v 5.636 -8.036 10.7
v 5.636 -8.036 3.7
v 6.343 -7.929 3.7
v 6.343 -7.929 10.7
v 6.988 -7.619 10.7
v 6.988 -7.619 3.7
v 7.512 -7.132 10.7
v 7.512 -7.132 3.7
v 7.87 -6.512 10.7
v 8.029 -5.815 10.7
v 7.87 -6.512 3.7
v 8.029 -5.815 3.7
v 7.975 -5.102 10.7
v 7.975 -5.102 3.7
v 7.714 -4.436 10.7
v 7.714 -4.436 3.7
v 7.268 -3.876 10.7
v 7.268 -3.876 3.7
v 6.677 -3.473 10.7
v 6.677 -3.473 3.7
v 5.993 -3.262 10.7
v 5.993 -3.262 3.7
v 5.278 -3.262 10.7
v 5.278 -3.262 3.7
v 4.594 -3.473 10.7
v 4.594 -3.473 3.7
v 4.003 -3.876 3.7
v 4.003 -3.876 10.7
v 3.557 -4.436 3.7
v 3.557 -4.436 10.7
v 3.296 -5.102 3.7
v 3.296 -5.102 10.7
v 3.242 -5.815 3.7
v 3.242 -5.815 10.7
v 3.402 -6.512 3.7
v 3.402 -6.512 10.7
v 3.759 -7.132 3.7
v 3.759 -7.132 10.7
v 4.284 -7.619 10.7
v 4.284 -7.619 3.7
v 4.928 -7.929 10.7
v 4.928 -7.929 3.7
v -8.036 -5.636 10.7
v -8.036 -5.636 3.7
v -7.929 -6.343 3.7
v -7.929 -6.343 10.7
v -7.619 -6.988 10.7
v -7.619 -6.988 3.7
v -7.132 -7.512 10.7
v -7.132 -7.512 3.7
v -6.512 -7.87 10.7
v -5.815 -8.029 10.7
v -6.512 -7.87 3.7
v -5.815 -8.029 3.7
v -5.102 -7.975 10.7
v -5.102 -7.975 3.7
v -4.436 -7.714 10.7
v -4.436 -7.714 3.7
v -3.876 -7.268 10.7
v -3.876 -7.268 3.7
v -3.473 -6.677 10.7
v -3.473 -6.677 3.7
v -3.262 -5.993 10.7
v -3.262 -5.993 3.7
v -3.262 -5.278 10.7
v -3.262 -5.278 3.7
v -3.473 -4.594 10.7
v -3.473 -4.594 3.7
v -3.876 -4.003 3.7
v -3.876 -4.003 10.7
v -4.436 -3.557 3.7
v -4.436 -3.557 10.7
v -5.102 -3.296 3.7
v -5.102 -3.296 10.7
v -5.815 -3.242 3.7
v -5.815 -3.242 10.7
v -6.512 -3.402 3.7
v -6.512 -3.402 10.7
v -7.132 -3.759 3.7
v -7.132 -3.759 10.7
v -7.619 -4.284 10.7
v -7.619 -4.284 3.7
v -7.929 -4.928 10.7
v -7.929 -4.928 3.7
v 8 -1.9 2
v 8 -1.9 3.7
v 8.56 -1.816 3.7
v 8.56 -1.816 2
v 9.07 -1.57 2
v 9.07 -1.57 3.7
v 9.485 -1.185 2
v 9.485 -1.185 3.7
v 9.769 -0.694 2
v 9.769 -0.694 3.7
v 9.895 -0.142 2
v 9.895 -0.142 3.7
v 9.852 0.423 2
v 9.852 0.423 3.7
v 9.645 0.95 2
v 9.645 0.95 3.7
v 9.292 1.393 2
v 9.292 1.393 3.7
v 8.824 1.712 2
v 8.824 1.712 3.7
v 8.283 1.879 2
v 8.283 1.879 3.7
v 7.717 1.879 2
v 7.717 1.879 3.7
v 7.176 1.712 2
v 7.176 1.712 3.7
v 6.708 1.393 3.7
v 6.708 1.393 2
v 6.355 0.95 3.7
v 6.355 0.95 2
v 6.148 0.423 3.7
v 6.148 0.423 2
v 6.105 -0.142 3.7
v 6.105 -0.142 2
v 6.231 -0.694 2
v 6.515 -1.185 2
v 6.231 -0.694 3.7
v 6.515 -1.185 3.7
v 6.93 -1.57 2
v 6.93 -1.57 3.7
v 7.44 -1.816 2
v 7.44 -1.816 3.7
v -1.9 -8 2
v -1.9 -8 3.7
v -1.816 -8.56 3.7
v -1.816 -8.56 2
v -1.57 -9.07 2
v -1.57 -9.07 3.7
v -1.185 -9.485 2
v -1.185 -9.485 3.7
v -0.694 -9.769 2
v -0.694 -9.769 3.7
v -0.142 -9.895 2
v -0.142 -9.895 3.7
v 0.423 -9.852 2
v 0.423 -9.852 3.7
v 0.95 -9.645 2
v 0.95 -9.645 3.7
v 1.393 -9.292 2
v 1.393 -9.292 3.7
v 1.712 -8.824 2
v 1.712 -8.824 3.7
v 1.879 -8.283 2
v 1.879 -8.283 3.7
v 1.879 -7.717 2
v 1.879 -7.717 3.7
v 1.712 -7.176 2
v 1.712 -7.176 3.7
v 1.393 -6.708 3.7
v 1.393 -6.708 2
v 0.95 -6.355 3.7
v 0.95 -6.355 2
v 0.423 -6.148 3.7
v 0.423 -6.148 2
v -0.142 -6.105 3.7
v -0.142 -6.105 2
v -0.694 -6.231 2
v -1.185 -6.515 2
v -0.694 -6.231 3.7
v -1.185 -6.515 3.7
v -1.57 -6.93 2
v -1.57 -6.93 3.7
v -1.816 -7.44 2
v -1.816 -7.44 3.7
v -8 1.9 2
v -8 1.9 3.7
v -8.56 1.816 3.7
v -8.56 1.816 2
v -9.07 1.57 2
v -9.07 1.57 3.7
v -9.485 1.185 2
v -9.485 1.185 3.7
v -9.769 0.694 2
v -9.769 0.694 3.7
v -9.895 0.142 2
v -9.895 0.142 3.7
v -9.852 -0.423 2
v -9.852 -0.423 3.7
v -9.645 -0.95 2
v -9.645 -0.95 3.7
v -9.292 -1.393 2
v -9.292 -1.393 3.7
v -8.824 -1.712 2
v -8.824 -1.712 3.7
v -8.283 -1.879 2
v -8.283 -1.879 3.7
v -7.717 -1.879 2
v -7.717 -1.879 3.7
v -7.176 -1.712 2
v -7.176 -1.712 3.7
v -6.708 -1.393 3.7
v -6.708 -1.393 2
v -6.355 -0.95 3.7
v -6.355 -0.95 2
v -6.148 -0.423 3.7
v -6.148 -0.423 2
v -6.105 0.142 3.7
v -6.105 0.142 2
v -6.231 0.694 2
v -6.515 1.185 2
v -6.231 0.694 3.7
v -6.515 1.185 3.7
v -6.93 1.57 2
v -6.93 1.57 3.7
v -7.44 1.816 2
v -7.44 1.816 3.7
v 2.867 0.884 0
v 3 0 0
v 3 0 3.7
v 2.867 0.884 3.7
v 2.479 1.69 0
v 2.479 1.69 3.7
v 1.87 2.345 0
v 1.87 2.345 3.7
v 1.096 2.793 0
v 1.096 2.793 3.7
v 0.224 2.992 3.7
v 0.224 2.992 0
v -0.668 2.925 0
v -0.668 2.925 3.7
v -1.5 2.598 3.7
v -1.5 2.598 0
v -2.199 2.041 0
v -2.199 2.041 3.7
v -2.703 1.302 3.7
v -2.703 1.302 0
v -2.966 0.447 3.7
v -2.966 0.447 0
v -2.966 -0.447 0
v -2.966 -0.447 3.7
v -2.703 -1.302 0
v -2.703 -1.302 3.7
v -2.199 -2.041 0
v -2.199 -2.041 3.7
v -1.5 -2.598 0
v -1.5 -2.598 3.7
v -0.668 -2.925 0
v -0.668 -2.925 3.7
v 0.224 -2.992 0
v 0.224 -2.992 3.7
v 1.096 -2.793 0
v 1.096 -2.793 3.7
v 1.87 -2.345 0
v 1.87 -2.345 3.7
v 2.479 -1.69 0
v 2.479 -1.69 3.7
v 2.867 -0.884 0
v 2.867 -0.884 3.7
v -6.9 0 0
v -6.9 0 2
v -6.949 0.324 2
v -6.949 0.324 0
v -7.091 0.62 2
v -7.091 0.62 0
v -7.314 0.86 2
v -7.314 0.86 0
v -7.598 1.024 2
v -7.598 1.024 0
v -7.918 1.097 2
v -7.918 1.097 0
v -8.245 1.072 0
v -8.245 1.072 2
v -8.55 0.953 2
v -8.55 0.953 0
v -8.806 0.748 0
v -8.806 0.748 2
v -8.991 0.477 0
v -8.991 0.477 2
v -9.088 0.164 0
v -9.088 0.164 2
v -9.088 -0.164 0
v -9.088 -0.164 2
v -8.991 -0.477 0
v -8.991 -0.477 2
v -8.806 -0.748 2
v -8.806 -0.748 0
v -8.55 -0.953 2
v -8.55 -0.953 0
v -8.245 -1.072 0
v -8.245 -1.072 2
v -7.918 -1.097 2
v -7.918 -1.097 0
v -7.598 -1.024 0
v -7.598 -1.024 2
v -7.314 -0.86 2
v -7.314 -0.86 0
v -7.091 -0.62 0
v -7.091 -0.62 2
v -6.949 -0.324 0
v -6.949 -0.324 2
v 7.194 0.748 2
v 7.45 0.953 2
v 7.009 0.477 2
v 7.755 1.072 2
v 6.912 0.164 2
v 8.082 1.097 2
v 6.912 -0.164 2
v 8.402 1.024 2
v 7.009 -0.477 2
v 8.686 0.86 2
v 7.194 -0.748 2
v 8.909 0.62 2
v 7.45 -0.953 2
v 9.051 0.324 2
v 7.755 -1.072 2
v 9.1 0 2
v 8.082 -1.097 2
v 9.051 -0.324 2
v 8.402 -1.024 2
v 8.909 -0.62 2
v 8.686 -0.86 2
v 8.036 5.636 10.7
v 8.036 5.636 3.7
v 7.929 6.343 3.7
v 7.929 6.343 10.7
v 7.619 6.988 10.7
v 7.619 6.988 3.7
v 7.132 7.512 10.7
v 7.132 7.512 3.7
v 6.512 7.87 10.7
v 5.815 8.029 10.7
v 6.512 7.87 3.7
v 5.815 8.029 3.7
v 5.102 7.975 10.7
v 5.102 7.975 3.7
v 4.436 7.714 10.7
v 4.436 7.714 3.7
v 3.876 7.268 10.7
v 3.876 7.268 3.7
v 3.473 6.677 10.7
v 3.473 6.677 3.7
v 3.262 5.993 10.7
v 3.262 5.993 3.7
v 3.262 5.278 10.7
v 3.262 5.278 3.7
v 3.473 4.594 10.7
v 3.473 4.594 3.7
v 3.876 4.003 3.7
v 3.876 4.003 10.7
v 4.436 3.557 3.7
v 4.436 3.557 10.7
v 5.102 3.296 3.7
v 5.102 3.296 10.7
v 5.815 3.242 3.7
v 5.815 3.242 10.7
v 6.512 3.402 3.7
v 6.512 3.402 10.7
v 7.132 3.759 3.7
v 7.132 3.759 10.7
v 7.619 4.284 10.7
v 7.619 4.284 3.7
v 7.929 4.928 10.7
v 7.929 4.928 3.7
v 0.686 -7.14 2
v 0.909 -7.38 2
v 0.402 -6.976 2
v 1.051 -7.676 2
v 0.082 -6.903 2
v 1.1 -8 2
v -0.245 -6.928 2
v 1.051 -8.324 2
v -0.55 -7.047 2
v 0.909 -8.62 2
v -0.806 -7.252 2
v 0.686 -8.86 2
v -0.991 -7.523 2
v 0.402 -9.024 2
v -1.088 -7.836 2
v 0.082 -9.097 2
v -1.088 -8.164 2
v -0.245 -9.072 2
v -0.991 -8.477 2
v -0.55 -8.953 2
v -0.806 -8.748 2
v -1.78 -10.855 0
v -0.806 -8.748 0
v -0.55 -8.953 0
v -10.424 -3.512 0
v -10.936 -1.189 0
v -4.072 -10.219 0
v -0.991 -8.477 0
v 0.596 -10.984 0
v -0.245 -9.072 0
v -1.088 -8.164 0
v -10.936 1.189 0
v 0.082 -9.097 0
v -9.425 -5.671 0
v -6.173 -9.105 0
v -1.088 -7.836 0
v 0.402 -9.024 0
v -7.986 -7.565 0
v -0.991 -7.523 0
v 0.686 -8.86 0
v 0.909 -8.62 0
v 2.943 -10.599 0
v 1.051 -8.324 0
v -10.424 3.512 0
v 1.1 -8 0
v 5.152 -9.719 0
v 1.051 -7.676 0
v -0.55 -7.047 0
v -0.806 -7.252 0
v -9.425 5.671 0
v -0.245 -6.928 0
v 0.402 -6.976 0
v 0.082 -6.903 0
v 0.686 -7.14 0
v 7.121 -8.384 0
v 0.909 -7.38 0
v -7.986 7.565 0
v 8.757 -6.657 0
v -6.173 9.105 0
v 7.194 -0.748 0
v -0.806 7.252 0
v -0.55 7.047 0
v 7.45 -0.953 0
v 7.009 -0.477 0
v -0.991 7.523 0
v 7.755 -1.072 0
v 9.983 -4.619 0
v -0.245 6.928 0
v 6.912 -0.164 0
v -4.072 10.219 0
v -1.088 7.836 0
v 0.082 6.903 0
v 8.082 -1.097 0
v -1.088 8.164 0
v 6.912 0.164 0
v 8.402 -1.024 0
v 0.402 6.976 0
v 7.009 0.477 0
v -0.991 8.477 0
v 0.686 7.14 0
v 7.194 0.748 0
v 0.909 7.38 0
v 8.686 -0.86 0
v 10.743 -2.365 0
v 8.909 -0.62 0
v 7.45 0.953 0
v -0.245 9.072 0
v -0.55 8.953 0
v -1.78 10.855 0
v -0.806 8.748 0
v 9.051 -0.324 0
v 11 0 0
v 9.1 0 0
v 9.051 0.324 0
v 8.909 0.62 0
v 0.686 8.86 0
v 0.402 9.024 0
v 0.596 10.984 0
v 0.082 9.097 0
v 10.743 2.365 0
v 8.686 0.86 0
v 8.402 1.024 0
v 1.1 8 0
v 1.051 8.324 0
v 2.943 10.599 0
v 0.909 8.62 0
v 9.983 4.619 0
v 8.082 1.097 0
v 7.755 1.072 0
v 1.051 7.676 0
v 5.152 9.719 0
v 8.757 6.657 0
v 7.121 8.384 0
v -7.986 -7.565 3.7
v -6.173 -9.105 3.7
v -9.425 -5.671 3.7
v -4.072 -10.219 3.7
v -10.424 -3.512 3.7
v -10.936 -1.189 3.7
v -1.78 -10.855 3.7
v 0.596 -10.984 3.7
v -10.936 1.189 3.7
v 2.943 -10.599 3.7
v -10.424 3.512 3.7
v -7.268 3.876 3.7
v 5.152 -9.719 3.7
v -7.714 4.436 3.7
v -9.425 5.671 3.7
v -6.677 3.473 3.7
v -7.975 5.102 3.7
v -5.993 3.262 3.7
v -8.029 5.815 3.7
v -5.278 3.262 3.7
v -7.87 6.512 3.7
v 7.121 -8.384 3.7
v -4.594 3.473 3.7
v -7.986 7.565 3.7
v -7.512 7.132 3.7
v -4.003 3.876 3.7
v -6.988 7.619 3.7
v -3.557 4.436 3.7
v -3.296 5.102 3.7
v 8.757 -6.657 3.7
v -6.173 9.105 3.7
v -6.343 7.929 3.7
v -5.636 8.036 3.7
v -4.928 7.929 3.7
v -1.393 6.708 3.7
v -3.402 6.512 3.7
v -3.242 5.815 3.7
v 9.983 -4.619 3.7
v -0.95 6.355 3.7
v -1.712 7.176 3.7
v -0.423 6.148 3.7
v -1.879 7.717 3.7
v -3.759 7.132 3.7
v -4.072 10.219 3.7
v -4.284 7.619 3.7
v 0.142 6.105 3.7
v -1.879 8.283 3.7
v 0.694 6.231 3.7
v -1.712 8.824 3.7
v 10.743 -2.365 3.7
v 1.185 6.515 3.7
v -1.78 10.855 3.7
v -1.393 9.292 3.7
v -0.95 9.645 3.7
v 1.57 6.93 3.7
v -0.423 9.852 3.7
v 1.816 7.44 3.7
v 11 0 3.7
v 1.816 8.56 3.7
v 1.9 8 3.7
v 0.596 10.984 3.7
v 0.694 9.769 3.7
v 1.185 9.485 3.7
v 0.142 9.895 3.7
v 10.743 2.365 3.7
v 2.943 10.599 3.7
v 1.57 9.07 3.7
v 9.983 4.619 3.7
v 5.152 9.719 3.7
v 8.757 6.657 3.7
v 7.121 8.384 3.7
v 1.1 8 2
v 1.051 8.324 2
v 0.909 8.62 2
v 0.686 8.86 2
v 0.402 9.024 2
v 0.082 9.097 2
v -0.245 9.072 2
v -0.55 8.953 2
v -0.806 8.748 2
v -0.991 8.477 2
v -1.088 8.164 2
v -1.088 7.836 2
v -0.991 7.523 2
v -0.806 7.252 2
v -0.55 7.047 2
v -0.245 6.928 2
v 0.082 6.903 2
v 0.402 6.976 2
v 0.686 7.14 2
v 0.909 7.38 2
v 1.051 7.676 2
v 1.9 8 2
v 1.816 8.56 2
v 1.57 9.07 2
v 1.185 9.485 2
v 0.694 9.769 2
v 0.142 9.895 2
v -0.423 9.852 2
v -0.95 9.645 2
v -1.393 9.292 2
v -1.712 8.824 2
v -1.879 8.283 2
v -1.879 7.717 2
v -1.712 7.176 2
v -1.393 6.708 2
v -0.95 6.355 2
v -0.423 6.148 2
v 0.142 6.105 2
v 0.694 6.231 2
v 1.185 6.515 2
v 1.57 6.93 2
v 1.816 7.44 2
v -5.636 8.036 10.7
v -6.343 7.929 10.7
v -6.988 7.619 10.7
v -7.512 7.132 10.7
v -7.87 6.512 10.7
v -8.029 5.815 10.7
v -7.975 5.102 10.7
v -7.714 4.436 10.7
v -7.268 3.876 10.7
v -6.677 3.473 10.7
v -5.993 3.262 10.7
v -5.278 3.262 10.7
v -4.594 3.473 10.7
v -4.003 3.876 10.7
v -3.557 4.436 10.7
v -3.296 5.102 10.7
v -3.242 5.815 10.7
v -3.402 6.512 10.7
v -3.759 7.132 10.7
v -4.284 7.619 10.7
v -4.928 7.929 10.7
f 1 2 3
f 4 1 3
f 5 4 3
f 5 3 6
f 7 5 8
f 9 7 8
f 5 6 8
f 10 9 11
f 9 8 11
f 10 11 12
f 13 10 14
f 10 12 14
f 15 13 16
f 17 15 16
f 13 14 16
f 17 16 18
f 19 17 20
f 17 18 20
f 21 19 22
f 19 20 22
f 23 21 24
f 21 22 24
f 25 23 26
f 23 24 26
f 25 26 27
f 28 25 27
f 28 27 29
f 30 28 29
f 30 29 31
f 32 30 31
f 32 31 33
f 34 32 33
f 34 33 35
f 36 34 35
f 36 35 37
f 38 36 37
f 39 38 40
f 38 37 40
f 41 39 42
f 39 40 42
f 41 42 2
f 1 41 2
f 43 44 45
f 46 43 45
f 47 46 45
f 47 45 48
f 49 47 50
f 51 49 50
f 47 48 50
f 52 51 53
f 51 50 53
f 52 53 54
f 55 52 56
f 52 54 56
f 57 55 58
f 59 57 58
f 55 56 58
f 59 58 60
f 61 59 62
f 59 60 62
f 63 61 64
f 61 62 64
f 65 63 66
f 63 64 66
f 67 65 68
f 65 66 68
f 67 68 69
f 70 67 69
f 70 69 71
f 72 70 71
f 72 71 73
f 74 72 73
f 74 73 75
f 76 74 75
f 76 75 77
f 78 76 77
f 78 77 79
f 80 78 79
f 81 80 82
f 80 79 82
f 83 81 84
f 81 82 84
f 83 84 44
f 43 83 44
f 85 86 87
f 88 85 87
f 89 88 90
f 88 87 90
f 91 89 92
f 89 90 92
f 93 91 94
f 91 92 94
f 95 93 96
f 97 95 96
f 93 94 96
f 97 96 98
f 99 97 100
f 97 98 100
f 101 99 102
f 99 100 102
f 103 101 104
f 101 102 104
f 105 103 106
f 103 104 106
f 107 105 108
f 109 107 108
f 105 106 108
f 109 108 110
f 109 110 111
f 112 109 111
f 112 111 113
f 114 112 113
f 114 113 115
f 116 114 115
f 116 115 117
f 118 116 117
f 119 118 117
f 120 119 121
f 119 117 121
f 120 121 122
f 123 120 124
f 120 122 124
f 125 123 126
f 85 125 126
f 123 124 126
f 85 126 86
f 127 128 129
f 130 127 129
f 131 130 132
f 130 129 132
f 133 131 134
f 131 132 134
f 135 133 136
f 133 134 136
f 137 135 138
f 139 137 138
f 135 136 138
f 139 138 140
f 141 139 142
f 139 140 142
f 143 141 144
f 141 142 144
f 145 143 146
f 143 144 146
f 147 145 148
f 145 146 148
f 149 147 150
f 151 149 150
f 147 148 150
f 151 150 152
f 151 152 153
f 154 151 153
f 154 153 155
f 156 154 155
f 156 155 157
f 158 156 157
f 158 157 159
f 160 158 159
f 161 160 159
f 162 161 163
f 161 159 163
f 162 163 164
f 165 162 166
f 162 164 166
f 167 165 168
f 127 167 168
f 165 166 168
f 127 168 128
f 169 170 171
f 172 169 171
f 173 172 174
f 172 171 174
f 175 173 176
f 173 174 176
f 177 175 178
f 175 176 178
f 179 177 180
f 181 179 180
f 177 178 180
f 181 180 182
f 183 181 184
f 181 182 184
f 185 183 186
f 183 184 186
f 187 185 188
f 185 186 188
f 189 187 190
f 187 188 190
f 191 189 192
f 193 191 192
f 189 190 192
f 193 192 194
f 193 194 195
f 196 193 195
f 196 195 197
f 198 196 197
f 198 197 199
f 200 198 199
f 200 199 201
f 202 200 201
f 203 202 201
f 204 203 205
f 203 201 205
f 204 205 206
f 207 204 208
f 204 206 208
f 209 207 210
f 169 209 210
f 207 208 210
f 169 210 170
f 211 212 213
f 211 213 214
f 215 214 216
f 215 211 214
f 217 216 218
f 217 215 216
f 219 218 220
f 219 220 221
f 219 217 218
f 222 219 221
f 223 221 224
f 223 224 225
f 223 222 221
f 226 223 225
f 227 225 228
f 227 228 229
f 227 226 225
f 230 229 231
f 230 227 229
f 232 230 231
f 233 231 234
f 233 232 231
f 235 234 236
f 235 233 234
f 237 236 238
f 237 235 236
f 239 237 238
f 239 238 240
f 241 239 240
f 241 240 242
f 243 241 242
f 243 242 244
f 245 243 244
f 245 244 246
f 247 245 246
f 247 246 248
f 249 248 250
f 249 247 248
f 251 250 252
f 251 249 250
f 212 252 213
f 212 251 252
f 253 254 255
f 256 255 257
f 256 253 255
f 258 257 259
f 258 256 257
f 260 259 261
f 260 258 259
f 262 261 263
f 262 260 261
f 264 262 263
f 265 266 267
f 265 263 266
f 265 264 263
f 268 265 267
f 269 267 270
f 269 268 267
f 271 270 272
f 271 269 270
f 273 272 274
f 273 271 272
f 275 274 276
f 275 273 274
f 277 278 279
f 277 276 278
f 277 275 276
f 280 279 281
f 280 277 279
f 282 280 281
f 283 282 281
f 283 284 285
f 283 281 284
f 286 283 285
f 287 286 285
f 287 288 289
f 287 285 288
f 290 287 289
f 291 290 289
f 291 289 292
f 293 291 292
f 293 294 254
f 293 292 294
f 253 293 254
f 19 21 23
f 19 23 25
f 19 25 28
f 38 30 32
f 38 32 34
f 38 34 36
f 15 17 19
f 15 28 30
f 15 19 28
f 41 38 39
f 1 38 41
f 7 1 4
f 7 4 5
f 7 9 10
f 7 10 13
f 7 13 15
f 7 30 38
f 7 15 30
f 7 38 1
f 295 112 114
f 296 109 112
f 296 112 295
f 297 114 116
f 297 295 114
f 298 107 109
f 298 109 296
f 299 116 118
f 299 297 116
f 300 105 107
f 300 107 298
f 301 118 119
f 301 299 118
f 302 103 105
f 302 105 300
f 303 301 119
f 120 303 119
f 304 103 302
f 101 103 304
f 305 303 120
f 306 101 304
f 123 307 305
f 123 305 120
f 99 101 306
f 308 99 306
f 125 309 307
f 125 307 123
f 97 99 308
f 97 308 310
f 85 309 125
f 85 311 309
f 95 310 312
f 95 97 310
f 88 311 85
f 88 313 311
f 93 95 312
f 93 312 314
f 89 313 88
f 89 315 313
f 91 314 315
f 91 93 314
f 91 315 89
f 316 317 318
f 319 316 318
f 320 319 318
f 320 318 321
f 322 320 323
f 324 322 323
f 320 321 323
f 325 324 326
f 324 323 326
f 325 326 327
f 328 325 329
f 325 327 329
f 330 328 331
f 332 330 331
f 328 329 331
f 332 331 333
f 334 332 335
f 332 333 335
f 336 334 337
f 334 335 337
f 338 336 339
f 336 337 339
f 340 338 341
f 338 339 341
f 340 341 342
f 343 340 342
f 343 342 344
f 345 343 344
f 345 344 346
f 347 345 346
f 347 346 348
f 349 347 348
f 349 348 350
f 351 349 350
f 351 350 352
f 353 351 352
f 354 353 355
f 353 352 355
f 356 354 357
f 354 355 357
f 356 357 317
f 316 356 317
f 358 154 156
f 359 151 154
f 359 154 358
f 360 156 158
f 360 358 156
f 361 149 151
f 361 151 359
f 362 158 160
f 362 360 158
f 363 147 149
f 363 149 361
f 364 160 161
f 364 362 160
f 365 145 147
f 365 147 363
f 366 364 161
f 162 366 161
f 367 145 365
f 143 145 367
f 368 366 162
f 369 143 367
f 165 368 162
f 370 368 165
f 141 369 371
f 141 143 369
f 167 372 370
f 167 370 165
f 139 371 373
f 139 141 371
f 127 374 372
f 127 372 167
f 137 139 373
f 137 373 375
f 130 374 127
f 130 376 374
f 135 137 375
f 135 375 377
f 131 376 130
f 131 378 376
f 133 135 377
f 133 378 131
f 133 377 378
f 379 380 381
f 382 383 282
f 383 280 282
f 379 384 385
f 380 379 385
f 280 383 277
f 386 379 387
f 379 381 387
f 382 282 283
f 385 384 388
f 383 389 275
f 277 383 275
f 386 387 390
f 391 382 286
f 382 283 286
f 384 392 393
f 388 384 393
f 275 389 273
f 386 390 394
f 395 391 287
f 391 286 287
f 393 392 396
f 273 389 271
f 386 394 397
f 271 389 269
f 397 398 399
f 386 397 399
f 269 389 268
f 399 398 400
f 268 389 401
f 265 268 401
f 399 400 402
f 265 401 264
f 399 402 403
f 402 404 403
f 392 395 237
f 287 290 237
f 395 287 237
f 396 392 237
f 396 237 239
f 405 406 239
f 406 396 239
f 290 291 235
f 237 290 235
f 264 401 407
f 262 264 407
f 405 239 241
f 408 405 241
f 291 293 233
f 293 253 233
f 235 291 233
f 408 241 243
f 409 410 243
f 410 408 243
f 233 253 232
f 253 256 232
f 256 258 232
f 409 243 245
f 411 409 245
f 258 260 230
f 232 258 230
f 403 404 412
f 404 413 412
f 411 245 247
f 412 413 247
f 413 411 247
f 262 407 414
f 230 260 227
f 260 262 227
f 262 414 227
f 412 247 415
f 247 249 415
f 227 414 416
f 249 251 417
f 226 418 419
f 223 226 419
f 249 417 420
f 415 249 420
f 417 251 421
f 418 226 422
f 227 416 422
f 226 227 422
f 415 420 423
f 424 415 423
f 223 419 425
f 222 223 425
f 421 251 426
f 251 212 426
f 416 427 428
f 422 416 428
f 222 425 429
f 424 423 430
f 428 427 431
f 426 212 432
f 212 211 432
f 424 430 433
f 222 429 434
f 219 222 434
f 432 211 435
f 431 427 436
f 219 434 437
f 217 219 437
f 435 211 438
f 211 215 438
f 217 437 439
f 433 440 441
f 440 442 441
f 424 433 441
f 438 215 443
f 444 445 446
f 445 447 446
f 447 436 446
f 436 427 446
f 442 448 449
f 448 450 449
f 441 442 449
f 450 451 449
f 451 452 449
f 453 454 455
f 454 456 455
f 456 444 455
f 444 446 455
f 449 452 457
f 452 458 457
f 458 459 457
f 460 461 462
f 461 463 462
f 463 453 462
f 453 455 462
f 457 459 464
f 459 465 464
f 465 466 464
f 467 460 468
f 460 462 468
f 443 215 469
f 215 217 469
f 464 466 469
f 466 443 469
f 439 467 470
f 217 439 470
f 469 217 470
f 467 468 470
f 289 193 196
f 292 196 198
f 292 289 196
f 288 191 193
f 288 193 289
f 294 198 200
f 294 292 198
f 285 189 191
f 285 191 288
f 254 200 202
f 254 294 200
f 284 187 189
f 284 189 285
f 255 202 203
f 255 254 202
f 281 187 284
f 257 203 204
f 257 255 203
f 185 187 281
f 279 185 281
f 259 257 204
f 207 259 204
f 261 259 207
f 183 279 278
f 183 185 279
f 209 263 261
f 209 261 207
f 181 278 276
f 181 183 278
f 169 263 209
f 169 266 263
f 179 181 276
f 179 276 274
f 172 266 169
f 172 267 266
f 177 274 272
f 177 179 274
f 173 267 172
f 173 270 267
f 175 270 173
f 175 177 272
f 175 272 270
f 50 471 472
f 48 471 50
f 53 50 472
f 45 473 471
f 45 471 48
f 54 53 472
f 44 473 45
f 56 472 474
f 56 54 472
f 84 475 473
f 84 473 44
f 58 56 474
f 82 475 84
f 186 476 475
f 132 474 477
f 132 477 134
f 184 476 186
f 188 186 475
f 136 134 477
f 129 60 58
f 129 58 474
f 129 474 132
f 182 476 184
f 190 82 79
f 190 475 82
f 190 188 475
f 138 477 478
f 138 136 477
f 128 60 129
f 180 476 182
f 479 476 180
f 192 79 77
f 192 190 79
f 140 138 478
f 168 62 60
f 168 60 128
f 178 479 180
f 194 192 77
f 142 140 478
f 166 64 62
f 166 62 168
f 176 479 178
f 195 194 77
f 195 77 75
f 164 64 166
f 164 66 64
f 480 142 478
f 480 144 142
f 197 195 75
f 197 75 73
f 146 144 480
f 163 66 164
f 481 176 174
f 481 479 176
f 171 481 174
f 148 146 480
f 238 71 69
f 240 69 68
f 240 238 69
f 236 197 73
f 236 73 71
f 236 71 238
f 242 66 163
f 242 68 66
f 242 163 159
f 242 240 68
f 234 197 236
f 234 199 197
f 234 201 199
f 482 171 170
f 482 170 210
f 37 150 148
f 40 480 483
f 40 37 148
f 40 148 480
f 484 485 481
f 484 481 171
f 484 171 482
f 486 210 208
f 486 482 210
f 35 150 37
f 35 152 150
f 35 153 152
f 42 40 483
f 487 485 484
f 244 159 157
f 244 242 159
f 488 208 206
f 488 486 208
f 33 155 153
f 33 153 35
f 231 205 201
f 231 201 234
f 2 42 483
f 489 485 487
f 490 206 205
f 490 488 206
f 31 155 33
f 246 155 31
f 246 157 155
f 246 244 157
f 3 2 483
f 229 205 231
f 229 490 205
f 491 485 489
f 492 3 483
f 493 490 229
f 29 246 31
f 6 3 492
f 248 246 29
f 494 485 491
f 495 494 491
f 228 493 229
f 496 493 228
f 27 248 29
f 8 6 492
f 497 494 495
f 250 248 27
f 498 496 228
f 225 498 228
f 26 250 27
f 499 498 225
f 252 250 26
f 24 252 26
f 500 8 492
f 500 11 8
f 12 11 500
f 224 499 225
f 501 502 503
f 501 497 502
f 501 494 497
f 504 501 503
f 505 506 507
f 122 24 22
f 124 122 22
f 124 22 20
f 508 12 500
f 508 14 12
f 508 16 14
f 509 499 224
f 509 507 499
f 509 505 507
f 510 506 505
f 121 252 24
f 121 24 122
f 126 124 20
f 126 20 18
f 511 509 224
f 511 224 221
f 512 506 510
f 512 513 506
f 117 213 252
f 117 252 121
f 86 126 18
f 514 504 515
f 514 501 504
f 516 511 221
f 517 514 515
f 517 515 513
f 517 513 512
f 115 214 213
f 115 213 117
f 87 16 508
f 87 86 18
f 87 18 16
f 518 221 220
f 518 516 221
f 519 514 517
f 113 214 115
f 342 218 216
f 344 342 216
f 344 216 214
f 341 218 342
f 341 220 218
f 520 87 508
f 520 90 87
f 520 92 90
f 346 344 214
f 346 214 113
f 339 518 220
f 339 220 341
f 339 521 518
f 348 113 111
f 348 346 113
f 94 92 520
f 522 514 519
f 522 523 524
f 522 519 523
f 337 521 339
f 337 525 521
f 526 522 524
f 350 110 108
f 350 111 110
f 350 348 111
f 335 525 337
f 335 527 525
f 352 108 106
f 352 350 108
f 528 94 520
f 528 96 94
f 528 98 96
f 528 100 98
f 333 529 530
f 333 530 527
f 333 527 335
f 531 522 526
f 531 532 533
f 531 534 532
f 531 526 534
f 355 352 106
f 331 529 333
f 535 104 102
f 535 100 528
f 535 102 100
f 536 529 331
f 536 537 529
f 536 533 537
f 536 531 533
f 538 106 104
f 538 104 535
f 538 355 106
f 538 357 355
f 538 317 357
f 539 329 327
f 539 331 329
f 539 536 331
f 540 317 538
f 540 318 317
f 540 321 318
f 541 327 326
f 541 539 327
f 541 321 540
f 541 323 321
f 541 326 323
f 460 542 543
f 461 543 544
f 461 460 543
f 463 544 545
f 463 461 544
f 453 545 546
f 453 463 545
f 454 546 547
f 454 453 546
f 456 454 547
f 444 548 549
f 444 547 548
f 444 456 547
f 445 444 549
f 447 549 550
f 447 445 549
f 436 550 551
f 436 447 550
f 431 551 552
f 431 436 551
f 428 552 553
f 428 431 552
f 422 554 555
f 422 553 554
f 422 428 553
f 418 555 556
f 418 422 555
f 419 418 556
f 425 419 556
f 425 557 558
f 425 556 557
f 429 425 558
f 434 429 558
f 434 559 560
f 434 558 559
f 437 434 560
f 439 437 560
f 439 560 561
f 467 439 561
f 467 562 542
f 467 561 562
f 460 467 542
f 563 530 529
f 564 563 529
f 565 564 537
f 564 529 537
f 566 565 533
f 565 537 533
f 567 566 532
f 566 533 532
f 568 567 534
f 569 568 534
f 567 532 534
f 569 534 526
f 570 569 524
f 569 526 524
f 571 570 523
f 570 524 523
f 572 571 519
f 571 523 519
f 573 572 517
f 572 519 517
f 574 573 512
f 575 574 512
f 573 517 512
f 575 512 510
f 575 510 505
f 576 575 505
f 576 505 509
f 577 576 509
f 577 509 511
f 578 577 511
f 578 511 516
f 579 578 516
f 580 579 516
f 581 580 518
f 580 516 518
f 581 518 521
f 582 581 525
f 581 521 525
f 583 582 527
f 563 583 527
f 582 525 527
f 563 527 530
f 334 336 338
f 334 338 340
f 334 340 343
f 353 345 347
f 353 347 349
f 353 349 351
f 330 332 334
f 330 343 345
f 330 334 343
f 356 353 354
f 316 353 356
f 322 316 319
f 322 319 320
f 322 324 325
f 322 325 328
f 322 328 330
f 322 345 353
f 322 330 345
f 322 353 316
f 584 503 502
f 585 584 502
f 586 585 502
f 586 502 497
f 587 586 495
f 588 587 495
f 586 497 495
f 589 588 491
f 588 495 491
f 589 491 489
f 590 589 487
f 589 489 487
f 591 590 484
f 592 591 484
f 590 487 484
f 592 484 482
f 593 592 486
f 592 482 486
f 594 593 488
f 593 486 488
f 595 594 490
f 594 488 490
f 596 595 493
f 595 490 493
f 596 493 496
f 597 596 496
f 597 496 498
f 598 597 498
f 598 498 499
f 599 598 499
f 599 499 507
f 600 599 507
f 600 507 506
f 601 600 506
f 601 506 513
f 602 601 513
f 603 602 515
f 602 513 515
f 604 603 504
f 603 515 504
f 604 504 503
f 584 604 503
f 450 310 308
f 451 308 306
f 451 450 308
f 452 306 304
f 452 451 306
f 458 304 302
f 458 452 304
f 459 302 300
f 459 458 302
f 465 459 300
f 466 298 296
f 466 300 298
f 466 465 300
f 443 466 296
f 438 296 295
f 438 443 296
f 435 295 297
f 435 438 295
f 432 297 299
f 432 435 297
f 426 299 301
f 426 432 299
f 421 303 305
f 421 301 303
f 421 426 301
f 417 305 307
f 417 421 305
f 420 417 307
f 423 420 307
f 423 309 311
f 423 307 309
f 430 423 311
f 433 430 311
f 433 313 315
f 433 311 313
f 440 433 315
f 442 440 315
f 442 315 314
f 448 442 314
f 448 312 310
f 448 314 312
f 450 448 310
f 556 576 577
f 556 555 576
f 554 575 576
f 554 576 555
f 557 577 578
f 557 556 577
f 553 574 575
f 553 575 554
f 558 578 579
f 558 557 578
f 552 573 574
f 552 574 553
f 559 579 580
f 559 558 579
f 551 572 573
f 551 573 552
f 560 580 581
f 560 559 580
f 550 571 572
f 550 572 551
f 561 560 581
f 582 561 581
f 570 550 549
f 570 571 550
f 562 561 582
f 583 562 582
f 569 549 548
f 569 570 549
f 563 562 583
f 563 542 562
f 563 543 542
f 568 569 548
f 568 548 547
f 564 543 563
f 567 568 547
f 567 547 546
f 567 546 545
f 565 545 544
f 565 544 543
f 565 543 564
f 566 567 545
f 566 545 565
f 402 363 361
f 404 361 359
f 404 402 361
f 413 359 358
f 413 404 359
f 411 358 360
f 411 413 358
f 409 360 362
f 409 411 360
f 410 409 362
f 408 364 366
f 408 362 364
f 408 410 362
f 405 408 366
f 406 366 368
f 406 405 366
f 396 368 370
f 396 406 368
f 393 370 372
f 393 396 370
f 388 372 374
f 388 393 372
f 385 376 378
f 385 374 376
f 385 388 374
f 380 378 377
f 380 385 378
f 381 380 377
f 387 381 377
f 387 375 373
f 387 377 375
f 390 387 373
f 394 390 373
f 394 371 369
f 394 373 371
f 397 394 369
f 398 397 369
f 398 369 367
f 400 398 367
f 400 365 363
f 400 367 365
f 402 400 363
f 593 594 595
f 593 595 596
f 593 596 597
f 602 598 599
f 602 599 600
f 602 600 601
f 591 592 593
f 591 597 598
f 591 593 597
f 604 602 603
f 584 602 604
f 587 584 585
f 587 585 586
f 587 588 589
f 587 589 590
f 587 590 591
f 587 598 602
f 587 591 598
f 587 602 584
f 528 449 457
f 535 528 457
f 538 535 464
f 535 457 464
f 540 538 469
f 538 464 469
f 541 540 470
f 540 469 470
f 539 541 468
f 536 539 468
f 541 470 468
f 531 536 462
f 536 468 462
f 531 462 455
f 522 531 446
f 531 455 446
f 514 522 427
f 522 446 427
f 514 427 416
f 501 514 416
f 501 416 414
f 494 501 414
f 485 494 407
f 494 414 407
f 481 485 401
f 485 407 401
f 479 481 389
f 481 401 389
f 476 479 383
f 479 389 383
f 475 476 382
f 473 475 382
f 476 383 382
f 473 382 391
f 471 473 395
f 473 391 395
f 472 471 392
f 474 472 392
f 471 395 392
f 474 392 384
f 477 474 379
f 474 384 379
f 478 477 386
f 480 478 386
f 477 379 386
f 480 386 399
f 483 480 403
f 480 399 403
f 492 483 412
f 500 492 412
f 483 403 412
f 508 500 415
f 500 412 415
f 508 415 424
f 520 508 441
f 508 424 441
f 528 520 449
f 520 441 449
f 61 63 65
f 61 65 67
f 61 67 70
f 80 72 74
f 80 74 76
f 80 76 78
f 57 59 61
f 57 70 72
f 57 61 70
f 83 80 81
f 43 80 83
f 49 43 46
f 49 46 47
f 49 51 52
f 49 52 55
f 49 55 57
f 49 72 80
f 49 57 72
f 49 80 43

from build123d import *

# Parameters (mm, degrees)
DYNAMIXELHUB_R   = 11
DYNAMIXELHUB_R_2 = 3
DYNAMIXELHUB_R_3 = 1.1
HUB_DEPTH        = 3.7
SKETCH2_R        = 1.9
SCREWSLOT_DEPTH  = 1.7
SCREWSLOTS_COUNT = 4
SKETCH3_R        = 2.4
LEGOPIN_DEPTH    = 7
LEGOPINS_COUNT   = 4


with BuildPart() as part:
    # DynamixelHub → Hub (new body)
    with BuildSketch(Plane.XY):
        Circle(DYNAMIXELHUB_R)
        Circle(DYNAMIXELHUB_R_2, mode=Mode.SUBTRACT)
        with Locations((0, 8)):
            Circle(DYNAMIXELHUB_R_3, mode=Mode.SUBTRACT)
        with Locations((8, 0)):
            Circle(DYNAMIXELHUB_R_3, mode=Mode.SUBTRACT)
        with Locations((0, -8)):
            Circle(DYNAMIXELHUB_R_3, mode=Mode.SUBTRACT)
        with Locations((-8, 0)):
            Circle(DYNAMIXELHUB_R_3, mode=Mode.SUBTRACT)
    extrude(amount=HUB_DEPTH)

    # Sketch2 → ScrewSlot (cut)
    with BuildSketch(Plane.XY.offset(3.7)):
        with Locations((0, 8)):
            Circle(SKETCH2_R)
    screwslot = extrude(amount=-SCREWSLOT_DEPTH, mode=Mode.SUBTRACT)

    # ScrewSlots: ScrewSlot ×4 about axis
    screwslots_axis = Axis((0, 0, 0), (0, 0, 1))
    for i in range(1, SCREWSLOTS_COUNT):
        add(screwslot.rotate(screwslots_axis, i * 360 / SCREWSLOTS_COUNT), mode=Mode.SUBTRACT)

    # Sketch3 → LegoPin (add)
    with BuildSketch(Plane.XY.offset(3.7)):
        with Locations((5.635641046, 5.635641046)):
            Circle(SKETCH3_R)
    legopin = extrude(amount=LEGOPIN_DEPTH)

    # LegoPins: LegoPin ×4 about axis
    legopins_axis = Axis((0, 0, 0), (0, 0, 1))
    for i in range(1, LEGOPINS_COUNT):
        add(legopin.rotate(legopins_axis, i * 360 / LEGOPINS_COUNT))


solid = part.part
